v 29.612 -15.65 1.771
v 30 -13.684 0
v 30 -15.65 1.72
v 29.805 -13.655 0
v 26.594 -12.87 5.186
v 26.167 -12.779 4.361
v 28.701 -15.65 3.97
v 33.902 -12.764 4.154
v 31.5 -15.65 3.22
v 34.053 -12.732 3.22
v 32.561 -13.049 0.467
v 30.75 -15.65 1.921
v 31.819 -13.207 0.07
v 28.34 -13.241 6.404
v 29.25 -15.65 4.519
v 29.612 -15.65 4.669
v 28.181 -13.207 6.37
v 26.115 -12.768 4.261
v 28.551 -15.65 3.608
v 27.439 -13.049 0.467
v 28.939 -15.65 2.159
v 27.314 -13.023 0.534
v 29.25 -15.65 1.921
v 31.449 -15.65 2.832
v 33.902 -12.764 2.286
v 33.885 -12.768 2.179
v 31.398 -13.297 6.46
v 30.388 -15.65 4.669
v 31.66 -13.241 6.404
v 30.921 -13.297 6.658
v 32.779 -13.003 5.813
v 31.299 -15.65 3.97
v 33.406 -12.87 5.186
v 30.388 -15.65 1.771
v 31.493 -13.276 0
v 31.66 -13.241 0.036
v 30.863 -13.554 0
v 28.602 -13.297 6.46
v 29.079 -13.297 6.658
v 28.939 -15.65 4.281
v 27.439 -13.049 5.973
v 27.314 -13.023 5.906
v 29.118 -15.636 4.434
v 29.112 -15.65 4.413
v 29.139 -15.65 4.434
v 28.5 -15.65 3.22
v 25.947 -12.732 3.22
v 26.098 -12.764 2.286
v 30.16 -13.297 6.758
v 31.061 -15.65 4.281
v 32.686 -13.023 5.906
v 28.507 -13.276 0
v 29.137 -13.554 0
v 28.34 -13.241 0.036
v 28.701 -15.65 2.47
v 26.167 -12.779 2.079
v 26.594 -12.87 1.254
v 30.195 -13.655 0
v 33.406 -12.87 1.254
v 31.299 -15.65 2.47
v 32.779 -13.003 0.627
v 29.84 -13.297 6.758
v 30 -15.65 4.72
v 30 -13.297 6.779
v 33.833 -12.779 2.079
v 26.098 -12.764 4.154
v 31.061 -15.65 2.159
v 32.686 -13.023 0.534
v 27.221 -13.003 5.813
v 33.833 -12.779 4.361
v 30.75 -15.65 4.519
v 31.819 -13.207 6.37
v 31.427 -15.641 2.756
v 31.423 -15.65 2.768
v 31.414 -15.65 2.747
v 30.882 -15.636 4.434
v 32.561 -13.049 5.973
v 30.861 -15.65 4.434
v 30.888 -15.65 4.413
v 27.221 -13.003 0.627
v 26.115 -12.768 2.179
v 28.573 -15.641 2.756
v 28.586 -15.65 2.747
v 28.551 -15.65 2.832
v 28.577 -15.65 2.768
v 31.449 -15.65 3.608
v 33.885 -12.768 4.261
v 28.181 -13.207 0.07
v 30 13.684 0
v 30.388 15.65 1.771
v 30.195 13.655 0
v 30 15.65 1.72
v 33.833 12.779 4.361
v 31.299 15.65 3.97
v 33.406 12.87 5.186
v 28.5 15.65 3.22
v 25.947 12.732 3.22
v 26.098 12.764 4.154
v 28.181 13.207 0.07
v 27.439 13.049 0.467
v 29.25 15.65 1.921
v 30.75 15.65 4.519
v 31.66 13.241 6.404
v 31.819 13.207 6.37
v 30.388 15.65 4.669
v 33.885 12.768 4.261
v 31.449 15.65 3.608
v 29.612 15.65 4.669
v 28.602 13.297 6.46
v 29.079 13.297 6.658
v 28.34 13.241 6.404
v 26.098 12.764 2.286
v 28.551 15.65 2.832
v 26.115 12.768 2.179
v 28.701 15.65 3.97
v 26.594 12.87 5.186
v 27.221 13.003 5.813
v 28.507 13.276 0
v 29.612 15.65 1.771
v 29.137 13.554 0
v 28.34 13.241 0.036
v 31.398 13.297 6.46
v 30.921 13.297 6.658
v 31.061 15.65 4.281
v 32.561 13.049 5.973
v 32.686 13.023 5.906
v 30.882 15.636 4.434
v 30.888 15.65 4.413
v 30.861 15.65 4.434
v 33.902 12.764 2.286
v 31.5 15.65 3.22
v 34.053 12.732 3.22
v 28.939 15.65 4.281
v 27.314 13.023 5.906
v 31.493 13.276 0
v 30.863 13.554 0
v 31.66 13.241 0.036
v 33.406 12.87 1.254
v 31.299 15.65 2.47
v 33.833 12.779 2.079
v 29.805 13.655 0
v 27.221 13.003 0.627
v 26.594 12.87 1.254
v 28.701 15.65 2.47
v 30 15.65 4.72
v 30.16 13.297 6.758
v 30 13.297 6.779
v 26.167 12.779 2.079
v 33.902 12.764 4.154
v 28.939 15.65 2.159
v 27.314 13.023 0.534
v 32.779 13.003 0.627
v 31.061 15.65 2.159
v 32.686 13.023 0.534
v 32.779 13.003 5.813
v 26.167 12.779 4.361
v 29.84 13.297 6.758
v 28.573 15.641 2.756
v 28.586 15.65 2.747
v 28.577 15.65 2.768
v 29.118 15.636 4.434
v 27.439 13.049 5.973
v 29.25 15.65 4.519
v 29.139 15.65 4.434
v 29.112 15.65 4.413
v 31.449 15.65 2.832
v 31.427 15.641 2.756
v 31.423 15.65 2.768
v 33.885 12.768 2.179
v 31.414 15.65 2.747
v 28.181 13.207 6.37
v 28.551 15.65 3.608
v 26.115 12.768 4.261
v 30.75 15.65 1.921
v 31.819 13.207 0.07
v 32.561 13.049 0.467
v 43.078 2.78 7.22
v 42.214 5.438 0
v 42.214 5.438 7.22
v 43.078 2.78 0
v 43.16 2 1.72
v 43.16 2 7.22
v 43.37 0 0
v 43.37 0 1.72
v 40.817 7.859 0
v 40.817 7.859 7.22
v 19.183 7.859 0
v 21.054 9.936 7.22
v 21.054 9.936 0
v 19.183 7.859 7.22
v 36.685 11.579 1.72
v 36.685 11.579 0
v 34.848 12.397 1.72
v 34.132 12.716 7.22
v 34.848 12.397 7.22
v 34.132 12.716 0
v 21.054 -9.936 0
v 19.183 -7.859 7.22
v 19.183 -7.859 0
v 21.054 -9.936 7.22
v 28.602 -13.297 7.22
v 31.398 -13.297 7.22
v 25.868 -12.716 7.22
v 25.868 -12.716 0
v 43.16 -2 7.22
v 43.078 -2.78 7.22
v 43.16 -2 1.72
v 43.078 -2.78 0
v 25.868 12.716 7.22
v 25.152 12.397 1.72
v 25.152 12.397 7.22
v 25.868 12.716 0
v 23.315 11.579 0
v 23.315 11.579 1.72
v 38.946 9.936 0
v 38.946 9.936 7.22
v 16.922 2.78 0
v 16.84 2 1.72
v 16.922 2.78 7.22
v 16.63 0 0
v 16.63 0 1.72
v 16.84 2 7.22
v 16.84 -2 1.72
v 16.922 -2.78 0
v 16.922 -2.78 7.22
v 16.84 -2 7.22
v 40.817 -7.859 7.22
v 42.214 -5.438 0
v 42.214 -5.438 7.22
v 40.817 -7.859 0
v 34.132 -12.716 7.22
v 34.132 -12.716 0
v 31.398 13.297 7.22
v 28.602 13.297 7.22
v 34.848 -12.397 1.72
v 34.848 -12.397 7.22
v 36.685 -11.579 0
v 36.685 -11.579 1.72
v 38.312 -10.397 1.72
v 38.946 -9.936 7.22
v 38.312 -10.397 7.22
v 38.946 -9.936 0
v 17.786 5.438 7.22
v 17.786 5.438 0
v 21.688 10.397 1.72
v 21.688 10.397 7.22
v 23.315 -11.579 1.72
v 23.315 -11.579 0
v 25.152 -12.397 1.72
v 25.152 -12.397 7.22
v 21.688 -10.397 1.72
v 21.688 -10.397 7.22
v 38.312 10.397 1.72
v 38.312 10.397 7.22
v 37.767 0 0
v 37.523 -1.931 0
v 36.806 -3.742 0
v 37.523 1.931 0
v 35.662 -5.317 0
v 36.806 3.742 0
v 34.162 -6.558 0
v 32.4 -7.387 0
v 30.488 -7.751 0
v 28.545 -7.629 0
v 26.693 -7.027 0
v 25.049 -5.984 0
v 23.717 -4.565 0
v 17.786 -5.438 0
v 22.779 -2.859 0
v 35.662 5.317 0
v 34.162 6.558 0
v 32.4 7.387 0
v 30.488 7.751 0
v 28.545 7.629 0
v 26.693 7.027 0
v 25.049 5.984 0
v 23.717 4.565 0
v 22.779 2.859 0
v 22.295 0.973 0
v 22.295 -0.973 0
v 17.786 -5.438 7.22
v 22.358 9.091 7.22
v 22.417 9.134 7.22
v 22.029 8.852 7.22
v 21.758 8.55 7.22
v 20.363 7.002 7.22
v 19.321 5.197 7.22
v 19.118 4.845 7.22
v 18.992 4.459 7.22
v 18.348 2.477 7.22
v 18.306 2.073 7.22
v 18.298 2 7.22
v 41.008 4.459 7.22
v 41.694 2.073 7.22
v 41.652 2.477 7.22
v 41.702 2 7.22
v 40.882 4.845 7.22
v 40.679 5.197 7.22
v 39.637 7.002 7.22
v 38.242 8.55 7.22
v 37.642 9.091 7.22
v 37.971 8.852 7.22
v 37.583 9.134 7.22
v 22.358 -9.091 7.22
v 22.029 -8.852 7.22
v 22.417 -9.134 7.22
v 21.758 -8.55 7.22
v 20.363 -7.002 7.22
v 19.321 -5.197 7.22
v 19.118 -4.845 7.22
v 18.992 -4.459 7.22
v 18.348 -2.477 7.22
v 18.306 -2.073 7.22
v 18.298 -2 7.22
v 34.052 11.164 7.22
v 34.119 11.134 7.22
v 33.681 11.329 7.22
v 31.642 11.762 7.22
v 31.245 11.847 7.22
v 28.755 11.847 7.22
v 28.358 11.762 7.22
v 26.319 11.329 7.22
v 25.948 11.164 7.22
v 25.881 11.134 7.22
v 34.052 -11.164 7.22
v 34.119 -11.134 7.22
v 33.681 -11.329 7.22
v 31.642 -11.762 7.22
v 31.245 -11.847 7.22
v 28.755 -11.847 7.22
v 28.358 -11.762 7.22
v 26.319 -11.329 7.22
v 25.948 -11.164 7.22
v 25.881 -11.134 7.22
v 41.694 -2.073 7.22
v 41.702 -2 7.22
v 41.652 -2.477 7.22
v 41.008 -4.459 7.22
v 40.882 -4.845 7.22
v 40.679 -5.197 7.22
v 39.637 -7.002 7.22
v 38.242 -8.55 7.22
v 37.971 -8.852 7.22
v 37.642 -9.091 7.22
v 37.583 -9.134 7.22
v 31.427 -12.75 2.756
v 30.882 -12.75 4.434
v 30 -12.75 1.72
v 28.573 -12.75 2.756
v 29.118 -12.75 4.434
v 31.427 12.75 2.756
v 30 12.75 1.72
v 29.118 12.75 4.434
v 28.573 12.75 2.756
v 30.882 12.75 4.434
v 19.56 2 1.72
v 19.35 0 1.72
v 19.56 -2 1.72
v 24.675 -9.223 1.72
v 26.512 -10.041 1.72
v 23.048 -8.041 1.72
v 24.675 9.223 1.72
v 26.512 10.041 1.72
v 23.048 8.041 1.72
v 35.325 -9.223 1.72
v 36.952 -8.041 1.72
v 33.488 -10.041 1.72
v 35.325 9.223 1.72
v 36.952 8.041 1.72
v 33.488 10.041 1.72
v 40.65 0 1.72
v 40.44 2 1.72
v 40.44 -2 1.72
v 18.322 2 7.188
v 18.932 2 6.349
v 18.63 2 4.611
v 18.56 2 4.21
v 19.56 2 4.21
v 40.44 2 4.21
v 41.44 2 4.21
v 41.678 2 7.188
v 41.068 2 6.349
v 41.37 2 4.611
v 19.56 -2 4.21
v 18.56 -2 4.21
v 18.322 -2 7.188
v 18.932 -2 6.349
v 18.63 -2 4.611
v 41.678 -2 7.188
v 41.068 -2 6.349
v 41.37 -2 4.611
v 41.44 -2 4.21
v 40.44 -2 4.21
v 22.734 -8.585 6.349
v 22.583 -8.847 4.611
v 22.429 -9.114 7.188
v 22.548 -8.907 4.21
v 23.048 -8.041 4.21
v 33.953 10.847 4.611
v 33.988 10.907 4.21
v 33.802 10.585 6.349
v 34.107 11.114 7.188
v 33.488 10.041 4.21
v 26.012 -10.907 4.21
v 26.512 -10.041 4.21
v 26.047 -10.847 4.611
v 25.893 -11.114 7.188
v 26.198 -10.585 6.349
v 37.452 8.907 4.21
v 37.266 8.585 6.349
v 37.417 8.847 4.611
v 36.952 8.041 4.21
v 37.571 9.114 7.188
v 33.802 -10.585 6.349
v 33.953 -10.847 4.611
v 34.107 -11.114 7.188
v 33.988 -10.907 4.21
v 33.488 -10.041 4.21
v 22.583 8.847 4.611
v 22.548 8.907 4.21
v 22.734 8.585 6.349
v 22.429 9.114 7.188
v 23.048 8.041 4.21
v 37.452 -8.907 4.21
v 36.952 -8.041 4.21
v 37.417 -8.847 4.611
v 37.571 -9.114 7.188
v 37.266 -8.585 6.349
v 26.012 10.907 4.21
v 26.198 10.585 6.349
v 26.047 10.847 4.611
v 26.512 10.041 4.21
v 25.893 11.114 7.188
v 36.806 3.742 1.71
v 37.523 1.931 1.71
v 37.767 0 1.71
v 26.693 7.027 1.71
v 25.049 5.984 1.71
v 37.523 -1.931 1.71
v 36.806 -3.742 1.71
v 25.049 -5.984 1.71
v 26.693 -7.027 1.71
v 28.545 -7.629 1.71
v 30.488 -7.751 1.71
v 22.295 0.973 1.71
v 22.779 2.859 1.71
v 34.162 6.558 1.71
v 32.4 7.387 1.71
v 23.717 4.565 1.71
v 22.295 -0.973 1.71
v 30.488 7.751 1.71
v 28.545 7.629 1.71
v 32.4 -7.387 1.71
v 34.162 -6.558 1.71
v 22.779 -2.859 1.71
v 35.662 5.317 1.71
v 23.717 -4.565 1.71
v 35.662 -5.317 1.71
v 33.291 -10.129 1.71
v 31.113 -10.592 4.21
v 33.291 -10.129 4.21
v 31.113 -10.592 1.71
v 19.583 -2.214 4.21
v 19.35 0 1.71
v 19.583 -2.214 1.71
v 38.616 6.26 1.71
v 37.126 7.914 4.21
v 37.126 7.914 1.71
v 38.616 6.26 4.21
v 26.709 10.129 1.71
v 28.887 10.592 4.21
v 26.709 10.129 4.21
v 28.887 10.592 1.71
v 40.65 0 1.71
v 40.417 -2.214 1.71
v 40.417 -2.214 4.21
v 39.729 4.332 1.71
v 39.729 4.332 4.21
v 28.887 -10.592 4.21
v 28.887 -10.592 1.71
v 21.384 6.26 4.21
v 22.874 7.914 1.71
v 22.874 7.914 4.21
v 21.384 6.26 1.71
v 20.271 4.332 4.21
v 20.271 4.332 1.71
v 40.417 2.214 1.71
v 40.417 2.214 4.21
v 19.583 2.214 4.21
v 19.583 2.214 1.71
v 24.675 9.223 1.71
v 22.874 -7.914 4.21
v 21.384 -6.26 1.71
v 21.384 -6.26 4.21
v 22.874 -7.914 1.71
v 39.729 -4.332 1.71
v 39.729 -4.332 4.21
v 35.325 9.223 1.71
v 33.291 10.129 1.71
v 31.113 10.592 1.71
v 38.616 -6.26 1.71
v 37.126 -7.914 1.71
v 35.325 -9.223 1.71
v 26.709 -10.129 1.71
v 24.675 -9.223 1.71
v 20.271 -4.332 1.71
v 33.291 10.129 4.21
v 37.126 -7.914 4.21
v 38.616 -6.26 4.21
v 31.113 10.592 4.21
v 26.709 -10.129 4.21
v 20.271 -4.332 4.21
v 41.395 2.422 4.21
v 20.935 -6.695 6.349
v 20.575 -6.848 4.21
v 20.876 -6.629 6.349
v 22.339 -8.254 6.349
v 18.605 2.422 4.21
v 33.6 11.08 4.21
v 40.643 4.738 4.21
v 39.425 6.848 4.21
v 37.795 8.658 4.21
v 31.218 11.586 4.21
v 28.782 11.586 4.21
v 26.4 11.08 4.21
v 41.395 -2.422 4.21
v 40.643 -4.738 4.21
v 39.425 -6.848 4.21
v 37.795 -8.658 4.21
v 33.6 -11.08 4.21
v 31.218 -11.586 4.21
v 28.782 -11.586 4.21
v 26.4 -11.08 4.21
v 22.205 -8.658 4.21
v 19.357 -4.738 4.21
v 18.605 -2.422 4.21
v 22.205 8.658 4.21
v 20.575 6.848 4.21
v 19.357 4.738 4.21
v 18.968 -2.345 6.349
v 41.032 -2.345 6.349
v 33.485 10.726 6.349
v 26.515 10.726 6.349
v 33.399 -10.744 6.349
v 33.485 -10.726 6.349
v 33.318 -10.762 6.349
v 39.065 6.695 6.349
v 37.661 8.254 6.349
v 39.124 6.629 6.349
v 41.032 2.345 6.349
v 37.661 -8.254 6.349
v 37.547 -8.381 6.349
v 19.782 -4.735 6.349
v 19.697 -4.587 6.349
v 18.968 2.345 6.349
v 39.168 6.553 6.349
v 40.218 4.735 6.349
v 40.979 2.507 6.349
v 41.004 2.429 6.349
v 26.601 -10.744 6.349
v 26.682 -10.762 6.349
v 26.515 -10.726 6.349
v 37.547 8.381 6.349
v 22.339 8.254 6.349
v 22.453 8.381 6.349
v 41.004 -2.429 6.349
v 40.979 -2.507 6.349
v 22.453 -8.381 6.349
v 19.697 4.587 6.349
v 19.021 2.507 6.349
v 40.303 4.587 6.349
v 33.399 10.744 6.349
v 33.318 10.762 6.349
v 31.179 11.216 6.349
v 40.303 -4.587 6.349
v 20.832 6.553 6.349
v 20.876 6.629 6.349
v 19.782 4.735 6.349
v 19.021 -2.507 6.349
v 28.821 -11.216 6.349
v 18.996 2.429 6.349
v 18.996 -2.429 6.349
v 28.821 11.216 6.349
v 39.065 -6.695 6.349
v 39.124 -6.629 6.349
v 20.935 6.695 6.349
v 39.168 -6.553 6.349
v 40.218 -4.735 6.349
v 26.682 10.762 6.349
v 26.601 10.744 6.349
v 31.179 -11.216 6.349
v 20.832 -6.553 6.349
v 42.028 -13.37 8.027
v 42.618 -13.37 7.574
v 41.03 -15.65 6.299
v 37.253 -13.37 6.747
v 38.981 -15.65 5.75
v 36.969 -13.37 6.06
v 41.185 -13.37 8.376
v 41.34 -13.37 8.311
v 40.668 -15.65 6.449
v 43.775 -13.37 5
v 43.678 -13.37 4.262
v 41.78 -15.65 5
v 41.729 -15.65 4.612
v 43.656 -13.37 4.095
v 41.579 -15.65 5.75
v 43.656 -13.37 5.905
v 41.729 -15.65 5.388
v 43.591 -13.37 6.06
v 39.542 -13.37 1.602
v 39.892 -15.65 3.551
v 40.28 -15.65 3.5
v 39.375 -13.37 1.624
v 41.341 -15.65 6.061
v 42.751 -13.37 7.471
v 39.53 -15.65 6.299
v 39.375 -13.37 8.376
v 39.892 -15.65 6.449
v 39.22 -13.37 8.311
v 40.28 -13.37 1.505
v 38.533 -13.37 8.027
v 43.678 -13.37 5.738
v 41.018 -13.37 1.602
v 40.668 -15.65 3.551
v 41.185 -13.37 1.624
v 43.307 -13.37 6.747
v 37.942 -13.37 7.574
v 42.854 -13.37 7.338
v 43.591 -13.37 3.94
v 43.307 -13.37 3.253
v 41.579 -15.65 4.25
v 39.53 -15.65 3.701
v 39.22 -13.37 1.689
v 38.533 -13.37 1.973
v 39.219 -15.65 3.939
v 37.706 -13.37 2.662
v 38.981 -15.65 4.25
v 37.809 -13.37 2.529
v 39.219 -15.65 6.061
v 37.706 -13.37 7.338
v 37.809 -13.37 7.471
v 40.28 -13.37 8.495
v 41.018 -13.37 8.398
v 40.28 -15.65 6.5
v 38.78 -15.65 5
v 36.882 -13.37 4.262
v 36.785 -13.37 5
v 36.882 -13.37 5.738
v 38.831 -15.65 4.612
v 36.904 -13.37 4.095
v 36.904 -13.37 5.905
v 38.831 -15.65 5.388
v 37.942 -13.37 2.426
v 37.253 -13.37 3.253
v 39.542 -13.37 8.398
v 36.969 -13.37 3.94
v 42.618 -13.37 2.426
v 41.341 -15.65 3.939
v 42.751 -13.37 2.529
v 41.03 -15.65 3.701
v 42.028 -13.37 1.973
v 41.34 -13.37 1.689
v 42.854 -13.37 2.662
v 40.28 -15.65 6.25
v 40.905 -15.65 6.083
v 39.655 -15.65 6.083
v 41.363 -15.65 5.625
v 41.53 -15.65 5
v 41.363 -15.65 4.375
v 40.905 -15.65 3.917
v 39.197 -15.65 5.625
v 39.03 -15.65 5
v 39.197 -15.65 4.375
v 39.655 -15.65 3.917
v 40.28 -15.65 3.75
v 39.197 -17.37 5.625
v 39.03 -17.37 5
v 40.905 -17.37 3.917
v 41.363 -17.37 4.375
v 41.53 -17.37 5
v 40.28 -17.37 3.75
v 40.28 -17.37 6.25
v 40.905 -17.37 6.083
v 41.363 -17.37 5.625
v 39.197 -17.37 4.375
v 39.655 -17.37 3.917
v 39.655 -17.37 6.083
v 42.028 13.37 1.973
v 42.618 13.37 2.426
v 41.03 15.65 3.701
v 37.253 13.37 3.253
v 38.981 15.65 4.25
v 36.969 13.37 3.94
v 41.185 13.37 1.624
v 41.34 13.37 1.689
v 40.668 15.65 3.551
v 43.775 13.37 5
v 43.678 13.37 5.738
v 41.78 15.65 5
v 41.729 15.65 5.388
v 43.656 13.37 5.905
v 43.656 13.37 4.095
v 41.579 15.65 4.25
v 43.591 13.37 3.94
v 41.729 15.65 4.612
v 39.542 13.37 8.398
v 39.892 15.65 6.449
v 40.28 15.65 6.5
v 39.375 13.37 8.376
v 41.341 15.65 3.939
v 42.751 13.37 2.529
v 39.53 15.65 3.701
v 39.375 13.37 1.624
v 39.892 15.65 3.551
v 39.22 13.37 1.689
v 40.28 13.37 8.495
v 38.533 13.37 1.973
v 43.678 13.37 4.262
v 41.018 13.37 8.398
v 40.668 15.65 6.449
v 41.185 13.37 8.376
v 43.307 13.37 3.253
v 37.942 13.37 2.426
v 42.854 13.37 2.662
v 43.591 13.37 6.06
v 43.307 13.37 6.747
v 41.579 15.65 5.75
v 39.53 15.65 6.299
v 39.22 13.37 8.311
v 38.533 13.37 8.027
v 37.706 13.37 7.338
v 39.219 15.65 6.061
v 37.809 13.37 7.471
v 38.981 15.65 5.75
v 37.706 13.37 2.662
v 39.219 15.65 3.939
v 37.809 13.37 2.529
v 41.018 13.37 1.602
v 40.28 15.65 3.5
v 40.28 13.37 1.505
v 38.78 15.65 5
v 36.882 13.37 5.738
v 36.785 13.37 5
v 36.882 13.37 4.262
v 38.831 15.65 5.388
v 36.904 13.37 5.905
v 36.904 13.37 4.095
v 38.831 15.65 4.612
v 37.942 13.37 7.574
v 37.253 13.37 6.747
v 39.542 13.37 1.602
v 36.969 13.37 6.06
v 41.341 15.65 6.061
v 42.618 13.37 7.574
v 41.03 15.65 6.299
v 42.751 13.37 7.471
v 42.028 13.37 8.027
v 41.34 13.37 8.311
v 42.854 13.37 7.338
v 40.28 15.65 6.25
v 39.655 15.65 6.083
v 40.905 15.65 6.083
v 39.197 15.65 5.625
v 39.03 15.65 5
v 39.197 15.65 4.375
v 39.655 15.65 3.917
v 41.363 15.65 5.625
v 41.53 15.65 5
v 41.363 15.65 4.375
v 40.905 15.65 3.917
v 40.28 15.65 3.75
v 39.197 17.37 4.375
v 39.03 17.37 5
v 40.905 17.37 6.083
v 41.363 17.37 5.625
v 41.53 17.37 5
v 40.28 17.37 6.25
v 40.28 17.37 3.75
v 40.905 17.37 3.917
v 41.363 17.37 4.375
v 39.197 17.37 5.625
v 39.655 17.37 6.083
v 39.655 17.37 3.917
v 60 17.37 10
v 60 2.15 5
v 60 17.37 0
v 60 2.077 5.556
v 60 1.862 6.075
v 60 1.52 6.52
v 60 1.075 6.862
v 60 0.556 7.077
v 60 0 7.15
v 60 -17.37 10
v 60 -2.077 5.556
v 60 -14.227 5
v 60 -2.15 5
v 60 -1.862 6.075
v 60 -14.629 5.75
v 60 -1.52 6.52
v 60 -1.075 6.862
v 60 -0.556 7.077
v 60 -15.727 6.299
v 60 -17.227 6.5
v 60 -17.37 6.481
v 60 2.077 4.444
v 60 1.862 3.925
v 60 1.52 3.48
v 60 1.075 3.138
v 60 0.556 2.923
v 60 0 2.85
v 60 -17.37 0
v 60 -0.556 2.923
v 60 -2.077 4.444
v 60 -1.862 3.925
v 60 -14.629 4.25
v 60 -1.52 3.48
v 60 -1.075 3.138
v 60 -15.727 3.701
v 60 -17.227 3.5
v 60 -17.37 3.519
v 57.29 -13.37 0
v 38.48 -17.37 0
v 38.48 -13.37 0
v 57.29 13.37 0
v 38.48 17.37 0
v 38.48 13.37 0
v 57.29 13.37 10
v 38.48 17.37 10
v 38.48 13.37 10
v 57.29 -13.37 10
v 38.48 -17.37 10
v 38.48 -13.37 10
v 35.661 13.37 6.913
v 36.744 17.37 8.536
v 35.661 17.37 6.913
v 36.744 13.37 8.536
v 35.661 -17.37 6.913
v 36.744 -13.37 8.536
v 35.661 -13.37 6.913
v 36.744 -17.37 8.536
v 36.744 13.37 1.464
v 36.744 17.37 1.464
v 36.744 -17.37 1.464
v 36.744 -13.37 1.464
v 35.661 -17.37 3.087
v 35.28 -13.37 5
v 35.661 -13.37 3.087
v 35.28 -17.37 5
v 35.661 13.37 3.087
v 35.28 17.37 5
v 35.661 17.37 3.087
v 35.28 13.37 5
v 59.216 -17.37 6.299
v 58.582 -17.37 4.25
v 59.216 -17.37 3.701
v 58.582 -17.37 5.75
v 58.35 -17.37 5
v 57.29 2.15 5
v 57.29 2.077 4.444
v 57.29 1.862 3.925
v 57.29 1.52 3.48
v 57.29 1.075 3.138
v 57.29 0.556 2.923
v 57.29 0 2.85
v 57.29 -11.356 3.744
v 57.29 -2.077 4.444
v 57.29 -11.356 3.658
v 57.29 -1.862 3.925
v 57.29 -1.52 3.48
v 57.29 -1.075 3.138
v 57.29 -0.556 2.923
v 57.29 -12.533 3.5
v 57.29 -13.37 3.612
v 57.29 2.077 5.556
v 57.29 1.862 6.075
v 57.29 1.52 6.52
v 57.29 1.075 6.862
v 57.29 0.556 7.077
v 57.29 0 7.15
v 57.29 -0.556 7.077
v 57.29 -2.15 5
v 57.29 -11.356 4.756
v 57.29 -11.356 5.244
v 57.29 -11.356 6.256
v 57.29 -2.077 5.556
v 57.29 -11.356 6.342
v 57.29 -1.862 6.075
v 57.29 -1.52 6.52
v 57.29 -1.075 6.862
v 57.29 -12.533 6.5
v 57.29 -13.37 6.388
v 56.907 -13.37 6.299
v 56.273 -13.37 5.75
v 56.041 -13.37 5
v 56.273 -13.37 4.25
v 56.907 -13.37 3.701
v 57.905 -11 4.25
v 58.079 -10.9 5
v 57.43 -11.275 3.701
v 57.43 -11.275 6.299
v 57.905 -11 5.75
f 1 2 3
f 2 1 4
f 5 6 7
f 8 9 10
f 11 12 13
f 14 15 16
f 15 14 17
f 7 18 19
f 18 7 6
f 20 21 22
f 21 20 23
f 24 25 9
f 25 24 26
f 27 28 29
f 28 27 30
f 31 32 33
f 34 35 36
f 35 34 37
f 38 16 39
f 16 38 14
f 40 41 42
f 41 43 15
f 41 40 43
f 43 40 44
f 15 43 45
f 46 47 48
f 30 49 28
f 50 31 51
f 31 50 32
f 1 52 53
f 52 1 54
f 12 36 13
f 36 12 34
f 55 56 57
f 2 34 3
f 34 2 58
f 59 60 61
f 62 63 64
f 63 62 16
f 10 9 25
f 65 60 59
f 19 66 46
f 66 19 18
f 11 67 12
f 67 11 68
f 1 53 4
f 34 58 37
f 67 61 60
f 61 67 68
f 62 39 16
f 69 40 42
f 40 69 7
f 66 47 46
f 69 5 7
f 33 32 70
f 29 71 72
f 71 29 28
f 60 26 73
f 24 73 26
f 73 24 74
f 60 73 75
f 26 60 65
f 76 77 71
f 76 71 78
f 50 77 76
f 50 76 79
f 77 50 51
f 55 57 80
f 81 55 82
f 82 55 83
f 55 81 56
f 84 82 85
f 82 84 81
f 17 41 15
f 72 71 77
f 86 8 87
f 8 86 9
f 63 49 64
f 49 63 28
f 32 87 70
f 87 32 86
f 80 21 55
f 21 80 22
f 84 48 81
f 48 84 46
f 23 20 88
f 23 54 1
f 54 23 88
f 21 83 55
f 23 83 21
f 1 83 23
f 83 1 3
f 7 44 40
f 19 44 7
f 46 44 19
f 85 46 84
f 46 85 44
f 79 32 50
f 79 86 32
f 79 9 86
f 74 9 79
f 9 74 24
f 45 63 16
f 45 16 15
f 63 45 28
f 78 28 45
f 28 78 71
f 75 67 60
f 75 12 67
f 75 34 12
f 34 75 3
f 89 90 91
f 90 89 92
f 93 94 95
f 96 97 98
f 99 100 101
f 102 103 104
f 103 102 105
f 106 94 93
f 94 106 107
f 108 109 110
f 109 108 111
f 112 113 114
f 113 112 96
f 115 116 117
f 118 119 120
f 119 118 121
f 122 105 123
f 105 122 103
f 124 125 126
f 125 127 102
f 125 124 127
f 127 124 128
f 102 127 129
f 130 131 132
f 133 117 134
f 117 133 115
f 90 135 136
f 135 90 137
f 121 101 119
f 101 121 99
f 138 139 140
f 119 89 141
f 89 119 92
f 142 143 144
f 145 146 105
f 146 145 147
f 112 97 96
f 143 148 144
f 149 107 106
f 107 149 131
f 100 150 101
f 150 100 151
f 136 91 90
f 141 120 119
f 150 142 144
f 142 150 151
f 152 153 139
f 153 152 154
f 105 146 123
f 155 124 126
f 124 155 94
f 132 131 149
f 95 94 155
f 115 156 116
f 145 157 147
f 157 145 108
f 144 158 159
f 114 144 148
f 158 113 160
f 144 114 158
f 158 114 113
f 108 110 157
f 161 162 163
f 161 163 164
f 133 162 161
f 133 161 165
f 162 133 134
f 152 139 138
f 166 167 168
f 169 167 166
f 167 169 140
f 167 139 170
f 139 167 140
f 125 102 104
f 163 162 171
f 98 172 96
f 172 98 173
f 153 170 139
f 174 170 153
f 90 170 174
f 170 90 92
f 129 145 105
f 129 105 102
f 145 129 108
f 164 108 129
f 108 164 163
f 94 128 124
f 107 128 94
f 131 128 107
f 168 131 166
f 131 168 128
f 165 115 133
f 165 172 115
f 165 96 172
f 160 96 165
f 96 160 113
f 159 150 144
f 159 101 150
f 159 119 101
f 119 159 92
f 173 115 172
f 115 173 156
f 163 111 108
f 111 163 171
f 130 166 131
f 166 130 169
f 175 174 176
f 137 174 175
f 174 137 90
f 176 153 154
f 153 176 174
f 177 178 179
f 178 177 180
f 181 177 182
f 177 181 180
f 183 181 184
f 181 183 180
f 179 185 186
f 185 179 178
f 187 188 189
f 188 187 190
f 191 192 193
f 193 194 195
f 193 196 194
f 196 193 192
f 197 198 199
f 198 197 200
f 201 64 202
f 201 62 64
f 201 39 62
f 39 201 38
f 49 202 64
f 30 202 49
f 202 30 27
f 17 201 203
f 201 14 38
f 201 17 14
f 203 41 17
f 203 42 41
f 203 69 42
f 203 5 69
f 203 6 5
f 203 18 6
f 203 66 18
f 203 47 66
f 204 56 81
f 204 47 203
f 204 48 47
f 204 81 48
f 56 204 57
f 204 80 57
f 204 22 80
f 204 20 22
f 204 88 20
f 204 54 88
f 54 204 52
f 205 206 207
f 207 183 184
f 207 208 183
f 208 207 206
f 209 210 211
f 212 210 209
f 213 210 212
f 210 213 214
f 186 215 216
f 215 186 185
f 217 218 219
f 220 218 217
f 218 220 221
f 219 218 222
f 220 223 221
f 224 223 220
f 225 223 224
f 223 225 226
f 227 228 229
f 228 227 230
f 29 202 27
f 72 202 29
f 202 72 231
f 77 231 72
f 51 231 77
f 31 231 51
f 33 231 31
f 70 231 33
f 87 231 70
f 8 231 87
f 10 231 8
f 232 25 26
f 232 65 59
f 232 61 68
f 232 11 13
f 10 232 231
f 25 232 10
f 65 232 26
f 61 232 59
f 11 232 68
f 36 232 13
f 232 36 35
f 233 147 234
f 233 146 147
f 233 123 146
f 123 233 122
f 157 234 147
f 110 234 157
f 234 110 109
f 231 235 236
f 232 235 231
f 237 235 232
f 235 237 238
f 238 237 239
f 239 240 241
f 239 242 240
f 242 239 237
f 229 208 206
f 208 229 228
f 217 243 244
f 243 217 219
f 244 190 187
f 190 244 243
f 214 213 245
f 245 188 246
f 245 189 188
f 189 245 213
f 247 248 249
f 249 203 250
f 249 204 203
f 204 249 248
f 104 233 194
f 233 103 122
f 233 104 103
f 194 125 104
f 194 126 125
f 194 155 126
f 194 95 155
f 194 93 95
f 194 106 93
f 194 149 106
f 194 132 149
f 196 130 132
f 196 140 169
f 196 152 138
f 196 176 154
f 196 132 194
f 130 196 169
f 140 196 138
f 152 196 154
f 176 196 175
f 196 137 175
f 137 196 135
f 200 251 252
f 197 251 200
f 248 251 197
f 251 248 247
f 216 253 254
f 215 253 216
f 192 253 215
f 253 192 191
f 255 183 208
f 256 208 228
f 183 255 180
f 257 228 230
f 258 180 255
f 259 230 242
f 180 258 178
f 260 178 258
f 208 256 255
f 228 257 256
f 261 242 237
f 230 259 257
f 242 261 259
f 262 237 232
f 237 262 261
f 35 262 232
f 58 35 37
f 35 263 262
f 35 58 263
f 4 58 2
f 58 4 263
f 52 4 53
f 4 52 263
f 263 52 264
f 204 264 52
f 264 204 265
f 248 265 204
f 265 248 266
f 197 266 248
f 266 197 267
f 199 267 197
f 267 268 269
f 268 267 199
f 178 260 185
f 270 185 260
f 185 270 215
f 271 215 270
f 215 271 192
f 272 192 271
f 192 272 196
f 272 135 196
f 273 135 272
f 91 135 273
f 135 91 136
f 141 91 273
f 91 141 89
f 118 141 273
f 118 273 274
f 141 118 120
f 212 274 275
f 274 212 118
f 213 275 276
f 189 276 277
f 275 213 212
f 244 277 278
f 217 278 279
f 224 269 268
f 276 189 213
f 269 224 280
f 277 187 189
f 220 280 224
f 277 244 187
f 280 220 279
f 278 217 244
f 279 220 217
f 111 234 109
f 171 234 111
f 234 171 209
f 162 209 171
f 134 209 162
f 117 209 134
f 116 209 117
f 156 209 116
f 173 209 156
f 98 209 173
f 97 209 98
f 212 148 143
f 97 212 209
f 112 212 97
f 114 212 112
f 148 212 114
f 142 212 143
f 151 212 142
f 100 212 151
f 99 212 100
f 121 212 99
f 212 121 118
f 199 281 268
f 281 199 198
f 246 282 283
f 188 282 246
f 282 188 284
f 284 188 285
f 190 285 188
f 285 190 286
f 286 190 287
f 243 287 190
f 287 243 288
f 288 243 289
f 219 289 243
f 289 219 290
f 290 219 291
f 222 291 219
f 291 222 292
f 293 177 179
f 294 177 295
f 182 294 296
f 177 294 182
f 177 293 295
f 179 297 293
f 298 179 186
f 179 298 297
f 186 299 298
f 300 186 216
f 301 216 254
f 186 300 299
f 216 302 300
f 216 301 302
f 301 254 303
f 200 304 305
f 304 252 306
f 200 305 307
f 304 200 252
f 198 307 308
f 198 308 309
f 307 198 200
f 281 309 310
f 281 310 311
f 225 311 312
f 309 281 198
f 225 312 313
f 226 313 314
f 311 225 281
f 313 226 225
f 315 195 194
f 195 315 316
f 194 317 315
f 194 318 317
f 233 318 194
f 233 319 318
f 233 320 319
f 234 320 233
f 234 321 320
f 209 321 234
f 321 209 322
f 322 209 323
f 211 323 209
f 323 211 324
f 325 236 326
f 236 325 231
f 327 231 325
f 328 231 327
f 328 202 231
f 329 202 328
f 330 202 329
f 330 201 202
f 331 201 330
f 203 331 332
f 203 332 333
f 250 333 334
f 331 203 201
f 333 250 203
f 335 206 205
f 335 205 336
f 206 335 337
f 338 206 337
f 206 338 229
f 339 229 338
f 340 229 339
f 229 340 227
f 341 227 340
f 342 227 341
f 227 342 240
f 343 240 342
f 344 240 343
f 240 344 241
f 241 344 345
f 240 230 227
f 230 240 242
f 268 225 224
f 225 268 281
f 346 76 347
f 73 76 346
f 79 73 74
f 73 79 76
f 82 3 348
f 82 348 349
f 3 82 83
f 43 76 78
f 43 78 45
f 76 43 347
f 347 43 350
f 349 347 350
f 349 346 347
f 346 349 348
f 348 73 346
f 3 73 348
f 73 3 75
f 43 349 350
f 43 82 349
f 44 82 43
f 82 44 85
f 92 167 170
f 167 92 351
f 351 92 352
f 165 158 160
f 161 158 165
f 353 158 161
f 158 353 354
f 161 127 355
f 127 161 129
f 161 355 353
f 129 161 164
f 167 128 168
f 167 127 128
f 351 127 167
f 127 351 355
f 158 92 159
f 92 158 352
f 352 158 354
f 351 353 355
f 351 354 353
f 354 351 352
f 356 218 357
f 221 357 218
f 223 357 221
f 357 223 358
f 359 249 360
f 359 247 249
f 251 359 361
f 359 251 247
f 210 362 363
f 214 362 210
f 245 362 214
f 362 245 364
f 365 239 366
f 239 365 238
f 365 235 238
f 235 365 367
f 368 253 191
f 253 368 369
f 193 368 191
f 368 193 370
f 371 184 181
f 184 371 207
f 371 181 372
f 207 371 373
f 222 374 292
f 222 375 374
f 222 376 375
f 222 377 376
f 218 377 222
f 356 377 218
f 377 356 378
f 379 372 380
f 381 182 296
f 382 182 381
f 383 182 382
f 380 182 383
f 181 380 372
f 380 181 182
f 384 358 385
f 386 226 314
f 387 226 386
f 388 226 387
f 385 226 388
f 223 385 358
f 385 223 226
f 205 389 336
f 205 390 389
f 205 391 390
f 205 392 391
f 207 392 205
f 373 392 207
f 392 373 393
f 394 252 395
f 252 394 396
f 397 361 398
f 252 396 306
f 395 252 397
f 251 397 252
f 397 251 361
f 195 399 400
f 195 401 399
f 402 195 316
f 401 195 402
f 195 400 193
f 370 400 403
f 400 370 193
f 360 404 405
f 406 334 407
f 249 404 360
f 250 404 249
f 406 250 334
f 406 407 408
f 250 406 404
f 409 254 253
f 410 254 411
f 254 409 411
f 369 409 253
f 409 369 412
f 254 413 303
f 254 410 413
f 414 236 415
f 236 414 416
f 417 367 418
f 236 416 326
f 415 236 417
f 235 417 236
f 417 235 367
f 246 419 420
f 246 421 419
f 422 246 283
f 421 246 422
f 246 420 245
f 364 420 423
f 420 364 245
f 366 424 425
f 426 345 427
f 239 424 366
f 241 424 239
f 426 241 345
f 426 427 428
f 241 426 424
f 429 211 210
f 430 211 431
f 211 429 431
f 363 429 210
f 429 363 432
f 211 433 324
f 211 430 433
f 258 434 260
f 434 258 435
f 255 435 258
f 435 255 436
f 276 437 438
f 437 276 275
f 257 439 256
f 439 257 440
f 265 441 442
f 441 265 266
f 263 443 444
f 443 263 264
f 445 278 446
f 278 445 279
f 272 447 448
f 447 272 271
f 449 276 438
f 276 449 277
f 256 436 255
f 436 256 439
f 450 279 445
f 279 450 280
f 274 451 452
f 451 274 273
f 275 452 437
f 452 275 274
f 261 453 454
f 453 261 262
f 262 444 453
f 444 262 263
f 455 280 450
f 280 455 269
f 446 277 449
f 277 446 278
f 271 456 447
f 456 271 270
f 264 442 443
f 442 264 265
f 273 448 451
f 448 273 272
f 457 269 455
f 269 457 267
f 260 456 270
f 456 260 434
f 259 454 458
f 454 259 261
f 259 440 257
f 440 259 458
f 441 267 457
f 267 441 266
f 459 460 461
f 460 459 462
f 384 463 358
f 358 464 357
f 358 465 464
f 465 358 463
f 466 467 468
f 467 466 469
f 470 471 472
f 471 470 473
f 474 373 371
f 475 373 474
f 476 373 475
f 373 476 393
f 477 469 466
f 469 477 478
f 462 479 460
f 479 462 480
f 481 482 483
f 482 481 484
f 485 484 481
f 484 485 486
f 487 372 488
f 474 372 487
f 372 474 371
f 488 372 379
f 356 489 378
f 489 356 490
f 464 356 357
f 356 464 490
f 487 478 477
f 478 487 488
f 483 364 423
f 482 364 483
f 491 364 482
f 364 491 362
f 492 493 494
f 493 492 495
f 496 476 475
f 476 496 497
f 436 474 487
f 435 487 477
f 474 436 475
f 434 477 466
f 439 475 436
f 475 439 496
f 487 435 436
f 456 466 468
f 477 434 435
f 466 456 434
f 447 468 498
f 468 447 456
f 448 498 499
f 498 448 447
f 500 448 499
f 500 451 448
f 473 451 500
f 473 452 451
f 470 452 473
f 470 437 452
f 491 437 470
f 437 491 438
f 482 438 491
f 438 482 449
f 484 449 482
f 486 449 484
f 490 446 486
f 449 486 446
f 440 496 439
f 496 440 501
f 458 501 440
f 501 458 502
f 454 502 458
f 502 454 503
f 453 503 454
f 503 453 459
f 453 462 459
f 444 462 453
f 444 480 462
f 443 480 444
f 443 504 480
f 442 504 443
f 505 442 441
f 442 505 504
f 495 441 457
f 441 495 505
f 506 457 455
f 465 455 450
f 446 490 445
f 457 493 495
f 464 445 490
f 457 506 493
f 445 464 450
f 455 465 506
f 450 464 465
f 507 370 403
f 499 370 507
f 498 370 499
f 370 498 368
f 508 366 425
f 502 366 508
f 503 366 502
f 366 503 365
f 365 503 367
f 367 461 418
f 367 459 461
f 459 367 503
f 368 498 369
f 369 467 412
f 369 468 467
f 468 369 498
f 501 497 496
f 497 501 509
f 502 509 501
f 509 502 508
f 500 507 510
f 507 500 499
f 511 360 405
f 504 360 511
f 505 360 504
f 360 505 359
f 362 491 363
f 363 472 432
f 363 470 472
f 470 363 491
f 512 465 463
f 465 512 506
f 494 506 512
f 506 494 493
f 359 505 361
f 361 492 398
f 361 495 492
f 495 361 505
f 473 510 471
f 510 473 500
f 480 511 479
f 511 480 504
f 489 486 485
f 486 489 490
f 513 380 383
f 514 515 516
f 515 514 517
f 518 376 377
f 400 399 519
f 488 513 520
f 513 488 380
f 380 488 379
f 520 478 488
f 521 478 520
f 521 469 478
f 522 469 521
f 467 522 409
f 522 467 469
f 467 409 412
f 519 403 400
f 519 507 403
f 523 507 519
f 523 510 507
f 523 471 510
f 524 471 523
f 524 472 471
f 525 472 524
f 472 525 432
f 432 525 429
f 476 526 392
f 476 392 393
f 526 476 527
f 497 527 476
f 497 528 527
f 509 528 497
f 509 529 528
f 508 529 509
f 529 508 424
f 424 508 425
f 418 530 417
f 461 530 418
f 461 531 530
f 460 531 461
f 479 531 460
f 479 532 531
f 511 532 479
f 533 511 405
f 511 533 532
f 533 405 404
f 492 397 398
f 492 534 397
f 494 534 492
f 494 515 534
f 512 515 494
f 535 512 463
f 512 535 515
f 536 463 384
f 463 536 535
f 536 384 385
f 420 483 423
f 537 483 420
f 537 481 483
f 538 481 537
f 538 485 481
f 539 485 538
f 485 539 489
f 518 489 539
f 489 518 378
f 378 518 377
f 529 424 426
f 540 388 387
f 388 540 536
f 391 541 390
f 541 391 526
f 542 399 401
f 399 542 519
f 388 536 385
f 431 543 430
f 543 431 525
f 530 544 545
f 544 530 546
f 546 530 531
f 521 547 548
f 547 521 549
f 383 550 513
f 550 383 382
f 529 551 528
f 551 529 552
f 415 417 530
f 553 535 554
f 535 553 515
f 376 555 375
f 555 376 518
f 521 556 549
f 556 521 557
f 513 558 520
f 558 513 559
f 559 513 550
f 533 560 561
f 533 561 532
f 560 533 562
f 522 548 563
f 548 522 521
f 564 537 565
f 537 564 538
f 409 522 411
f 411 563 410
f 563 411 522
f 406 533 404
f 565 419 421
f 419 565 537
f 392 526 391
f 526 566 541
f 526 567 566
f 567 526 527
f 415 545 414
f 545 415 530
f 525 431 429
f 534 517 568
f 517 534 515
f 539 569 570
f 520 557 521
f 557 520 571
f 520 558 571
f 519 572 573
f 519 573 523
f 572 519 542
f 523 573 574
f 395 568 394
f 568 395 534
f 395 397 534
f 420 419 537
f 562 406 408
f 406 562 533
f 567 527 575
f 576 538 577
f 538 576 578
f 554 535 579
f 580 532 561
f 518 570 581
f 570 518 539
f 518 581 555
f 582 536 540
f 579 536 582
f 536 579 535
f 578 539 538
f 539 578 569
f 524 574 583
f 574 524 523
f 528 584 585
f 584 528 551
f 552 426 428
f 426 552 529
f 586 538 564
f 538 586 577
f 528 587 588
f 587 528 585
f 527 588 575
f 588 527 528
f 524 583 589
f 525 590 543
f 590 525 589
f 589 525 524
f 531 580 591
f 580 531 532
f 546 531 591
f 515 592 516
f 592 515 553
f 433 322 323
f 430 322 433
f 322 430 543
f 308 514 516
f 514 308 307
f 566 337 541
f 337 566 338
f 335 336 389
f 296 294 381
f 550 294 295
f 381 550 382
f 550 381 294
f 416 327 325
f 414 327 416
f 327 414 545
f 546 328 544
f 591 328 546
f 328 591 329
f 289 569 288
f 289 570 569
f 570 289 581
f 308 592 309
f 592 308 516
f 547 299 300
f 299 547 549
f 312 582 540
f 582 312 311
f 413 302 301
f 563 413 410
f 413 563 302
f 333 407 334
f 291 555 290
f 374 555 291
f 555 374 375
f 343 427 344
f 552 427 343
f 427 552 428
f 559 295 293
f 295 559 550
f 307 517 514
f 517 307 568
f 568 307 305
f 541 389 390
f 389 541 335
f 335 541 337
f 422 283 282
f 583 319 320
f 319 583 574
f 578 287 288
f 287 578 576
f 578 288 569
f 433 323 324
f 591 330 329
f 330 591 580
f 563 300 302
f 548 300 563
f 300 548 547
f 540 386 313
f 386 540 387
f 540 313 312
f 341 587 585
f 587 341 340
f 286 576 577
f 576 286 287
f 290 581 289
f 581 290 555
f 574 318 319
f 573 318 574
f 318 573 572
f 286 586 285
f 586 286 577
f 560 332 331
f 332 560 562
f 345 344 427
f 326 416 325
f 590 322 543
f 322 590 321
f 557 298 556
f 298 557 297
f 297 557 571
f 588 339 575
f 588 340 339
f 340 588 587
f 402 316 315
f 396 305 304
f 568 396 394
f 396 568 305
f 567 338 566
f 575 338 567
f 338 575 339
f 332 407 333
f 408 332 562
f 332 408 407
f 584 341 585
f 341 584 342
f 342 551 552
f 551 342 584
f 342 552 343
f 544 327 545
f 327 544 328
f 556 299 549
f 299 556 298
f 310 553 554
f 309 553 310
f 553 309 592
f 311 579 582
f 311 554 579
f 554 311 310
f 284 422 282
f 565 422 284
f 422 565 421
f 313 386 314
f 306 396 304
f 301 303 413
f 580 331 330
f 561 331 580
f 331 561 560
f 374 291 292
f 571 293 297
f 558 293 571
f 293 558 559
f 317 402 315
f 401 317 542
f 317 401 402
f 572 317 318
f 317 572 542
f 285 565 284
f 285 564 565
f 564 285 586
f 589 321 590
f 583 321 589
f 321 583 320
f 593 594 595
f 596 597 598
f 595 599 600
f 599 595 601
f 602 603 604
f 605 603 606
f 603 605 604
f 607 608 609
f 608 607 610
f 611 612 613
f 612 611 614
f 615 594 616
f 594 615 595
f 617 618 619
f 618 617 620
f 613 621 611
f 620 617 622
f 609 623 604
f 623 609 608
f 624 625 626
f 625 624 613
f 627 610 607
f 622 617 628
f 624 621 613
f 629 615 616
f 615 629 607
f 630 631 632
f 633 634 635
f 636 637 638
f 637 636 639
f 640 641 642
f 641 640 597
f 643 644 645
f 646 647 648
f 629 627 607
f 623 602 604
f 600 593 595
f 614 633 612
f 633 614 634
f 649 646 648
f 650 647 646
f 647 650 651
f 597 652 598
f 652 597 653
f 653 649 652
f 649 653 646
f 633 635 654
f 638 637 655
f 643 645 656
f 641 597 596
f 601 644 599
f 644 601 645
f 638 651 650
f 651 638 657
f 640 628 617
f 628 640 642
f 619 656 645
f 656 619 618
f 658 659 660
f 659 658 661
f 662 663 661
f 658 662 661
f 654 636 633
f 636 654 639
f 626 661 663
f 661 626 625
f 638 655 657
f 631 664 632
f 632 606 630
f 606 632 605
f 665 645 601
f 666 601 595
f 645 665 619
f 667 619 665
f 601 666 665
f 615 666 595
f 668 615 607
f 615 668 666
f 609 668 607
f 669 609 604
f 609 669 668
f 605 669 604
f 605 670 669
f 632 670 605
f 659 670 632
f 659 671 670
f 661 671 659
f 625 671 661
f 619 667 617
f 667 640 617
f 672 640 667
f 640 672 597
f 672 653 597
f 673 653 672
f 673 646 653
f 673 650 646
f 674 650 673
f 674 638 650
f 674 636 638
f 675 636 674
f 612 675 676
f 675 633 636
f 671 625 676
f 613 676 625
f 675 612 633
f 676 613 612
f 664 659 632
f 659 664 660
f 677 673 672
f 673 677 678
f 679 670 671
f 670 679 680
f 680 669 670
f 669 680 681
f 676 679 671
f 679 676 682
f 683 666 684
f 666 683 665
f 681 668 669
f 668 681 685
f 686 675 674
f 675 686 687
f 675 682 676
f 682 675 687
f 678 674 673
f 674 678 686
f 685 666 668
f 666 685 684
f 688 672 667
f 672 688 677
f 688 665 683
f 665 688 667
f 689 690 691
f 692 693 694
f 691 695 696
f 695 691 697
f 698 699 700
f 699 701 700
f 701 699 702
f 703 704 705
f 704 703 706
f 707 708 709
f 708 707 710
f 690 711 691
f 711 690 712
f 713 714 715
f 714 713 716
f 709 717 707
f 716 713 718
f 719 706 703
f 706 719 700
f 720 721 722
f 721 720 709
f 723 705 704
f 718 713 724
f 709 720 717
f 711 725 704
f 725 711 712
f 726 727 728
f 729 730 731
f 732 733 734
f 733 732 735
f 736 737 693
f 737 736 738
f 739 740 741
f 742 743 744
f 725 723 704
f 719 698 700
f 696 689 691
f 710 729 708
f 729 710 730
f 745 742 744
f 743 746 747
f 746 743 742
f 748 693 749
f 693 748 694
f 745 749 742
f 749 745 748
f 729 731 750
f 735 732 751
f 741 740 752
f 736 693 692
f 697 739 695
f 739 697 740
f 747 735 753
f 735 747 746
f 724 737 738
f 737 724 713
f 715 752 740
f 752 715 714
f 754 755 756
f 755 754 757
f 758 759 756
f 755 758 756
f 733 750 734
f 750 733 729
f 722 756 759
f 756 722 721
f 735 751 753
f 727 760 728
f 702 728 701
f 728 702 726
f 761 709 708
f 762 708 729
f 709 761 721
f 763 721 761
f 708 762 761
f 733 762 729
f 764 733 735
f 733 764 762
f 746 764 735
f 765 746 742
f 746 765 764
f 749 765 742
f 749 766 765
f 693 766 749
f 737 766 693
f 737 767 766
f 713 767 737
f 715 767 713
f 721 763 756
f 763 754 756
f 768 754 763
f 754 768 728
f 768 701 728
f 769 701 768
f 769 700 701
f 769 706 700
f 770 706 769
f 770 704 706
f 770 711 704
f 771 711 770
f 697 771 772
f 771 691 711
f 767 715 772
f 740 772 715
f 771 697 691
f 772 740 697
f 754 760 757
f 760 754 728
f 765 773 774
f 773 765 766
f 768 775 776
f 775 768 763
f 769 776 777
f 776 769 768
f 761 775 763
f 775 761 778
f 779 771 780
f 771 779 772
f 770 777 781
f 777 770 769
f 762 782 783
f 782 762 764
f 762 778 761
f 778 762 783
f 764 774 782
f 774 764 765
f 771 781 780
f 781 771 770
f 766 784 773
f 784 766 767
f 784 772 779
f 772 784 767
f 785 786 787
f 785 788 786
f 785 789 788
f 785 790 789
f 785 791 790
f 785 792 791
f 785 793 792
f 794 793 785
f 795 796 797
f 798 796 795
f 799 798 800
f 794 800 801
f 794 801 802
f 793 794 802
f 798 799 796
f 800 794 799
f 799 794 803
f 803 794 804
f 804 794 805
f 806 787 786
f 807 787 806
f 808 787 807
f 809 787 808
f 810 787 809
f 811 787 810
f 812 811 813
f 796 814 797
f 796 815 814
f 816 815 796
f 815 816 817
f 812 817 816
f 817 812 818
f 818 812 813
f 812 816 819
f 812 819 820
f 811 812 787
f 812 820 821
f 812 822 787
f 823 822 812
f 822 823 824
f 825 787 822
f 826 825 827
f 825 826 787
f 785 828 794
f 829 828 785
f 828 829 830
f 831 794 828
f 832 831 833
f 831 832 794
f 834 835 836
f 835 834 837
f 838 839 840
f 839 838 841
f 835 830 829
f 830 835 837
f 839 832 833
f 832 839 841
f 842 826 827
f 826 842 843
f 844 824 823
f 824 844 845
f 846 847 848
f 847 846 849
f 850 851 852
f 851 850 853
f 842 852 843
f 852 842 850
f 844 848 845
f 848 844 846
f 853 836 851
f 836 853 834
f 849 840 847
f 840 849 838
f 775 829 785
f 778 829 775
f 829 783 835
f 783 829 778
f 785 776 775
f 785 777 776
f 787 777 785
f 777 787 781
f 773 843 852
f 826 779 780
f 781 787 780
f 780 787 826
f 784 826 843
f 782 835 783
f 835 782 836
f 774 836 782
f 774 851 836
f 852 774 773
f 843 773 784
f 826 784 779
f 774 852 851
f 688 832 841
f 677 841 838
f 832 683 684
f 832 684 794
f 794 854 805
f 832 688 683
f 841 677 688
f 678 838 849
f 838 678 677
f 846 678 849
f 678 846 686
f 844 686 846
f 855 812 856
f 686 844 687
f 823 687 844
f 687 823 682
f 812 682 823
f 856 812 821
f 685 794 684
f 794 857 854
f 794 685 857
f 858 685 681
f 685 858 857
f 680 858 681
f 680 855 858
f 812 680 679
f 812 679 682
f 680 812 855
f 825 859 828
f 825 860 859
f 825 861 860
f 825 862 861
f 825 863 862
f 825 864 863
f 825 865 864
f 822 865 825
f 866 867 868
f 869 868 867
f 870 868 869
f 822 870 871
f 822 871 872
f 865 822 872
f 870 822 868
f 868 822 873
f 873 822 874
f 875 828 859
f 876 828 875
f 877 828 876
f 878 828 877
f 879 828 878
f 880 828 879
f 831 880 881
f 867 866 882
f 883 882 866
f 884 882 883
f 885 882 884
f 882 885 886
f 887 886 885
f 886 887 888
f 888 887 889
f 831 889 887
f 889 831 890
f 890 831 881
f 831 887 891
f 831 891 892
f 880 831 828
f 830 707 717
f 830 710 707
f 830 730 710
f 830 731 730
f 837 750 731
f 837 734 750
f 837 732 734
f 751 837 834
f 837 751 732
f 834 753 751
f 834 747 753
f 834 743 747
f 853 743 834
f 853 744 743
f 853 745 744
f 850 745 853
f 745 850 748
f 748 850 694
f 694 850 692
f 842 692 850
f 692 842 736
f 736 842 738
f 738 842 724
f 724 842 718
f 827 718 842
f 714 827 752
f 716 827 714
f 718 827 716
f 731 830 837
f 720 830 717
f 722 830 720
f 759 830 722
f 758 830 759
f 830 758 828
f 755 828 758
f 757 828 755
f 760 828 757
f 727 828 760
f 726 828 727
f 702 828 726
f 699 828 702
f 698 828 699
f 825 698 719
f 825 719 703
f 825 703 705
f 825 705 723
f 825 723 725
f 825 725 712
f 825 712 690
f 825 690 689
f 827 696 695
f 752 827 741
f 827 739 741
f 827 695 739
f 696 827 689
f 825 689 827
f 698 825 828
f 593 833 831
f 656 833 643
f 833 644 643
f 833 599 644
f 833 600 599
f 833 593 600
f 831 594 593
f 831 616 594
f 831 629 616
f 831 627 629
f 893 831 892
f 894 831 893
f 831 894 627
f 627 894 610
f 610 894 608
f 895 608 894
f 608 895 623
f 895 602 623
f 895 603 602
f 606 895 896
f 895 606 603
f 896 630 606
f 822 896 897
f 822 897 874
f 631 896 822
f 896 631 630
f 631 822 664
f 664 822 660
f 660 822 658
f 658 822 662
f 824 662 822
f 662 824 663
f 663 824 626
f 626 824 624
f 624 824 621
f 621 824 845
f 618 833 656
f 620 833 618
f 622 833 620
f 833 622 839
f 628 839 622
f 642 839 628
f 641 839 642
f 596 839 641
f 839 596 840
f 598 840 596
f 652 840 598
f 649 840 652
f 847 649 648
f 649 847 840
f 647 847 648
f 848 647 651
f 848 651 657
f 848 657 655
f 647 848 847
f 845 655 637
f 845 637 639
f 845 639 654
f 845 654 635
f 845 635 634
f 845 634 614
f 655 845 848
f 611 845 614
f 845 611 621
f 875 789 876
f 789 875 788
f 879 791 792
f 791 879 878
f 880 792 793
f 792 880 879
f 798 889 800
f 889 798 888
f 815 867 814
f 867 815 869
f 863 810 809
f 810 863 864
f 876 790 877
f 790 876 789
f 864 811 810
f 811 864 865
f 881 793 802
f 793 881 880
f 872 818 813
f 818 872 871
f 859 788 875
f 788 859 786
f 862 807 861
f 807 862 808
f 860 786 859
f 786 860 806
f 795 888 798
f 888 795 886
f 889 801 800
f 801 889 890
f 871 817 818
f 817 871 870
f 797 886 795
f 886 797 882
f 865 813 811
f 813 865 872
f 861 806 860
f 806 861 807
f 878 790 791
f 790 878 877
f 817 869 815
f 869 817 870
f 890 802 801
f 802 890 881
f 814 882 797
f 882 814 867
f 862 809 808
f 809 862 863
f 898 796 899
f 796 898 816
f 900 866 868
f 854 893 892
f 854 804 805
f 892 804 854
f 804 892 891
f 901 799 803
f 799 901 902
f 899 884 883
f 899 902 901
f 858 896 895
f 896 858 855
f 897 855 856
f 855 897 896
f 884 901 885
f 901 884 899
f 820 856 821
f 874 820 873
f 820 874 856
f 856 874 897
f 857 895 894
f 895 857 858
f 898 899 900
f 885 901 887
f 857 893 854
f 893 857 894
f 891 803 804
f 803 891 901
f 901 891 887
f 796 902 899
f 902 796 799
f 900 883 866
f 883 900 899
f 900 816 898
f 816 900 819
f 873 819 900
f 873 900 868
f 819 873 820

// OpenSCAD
//////////////////////////////////////////////////////////////////////////////////////
///
///  Tiltable frame for G4-type SMD LED lamps
///
///  This is a little tiltable and rotatable frame to mount the easily available
///  and inexpensive round G4 type 12V SMD LED lamps.
///
///  The frame consists of two printed part, the LED holder and the base.  These
///  two parts are joined by a conical hinge, so that the angle of the lamp can
///  be adjusted as needed.  The conical hinge holds by friction, but screw holes
///  are also provided in case a firmer grip is needed. The frame has a central
///  screw hole so that it can be attached to any flat surface.  If a washer is
///  used and the screw is not tightened too strongly, the lamp can also be 
///  rotated around the screw, providing full angular coverage.  A hole in one corner
///  of the frame can be used for feeding the cables through.
///  
///  The led carrier is simply pushed into the led holder - it should snap in with
///  a click.
///
//////////////////////////////////////////////////////////////////////////////////////
///
///  2013-11-27 Heinz Spiess, Switzerland
///
///  released under Creative Commons - Attribution - Share Alike licence
//////////////////////////////////////////////////////////////////////////////////////

// The following are defined as parameters of the modules
// ledD = 23.3; // diameter of led carrier
// wall = 1.72; // thickness of walls

// The following are globally parametrized
ledM = 1;       // margin to outermost led
ledH = 3;       // led height
ledP = 0.7;     // position of click
ledC = 0.4;     // depth of click 
ledG = 4;       // gap width
ledB = 2;       // space needed at back of led
hingeW = 10;    // hinge width
hingeD = 4;     // hinge depth
hingeH = 18;    // hinge height
hingeR = 1.5;   // hinge radius
eps = 0;        // separation between outer and inner parts of hinge
granu = 24;     // angular granularity of hinge

// tiltable circular led holder
module ledholder(ledD=23.3,wall=1.72){
      
    difference(){
        union(){
	   // bottom plate
	   cylinder(r=ledD/2+wall,h=ledH+wall+ledB);
	   // hinge
	   for(a=[90,270])rotate(a)
	      translate([-ledD/2-hingeD,0,(wall+ledH/2)])
	         rotate([0,90,0])cylinder(r1=hingeR,r2=hingeW/2,h=hingeD,$fn=granu);

        }

        // screw holes in hinge
	for(a=[90,270])rotate(a)
	      translate([-ledD/2-hingeD-0.1,0,(wall+ledH/2)])
	         rotate([0,90,0])cylinder(r=hingeR-eps,h=hingeD-1);

        // cut off top excess part of hinge
	translate([0,0,ledH+wall+ledB])cylinder(r=ledD/2+wall+hingeD,h=hingeW);
        // cut off bottom excess part of hinge
	translate([0,0,-hingeW])cylinder(r=ledD/2+wall+hingeD,h=hingeW);
	// hole in bottom plate
	translate([0,0,-0.01])cylinder(r=ledD/3,h=wall+0.02);
	// spacer between bottom plate and led carrier
	translate([0,0,wall-0.01])cylinder(r=ledD/2-ledM,h=ledB+0.02);
	// seat of led carrier and lower snap-in
	translate([0,0,wall+ledB-0.01])cylinder(r=ledD/2,r2=ledD/2-ledC,h=ledP*ledH+0.2);
	// upper snap-in
	translate([0,0,wall+ledB+ledP*ledH-0.01])
	   cylinder(r1=ledD/2-ledC,r2=ledD/2+ledC,h=(1-ledP)*ledH+0.2);
        // cut-out 6 sectors
	for(a=[0:60:359])rotate(a)translate([-ledD,-ledG/2,wall])cube([2*ledD,ledG,2*ledH+ledB]);


    }
}

// base of led frame
module ledbase(ledD=23.3,hingeH=18,wall=1.72){
  difference(){
    union(){
        
	   hull(){
	      // rectangular bottom part
              translate([-hingeW/2,-ledD/2-eps-hingeD-wall,0])
	         cube([hingeW,ledD+2*eps+2*hingeD+2*wall,wall+hingeH+1.8]);
              // cylindical top part
	      translate([0,-ledD/2-eps-hingeD-wall,wall+hingeH])rotate([-90,0,0])
	         cylinder(r=hingeW/2,h=2*hingeD+2*wall+ledD+2*eps);
	   }
    }
    // rectangular cut-out
    translate([-hingeW/2-0.01,-ledD/2-eps-wall,wall+0.99])
       cube([hingeW+0.02,ledD+2*eps+2*wall,hingeH+hingeW/2+1]);
    // hinge cut-out
    for(a=[90,270])rotate(a)
       translate([-ledD/2+eps-hingeD,0,wall+hingeH])rotate([0,90,0]){
           // conical part
           cylinder(r1=hingeR,r2=hingeW/2,h=hingeD,$fn=granu);
	   // screw hole
           translate([0,0,-7])cylinder(r=hingeW/8,h=hingeD+9,$fn=12);

       }

    // central hole for mounting screw
    translate([0,0,-1])cylinder(r=4.3/2,h=wall+2,$fn=24);

    // side hole for feeding cables
    translate([0,-ledD/2-eps,wall+1.5])rotate([120,0,0])
           cylinder(r=1.5,h=hingeD+9,$fn=12);
  }
}

// This module composes base and led holder in their final position
// using a given tilt angle of the led holder
// *** Just for illustration - don't use for printing!!! ***
module compose(angle=0,ledD=23.3,hingeH=18,wall=1.72,ledB=0){
  //intersection(){  // use intersection to verify that there is no overlap
  union(){           // use union for normal drawing
    color("red")translate([0,0,hingeH-ledH/2])translate([0,0,+ledH/2+wall/2])rotate([0,angle,0])translate([0,0,-ledH/2-wall/2])ledholder(ledD=ledD,wall=wall,ledB=ledB);
    color("blue")ledbase(ledD=ledD,hingeH=hingeH,wall=wall);
  }
}


module LedFrame6() // AUTO_MAKE_STL
{
    %compose(angle=85,ledD=23.3,wall=1.72,ledB=2.5);
    translate([30,0,0])ledholder(ledD=23.3,wall=1.72,ledB=2.5);
    translate([60,0,hingeW/2])rotate([0,-90,0])ledbase(ledD=23.3,wall=1.72);
}

module LedFrame9() // AUTO_MAKE_STL
{
    %compose(angle=30,ledD=24.5,hingeH=24,wall=2.25,ledB=2.25);
    translate([30,0,0])ledholder(ledD=24.5,wall=2.25,ledB=2.25);
    translate([70,0,hingeW/2])rotate([0,-90,0])
       ledbase(ledD=24.5,hingeH=21,wall=2.25);
}

module LedFrame12() // AUTO_MAKE_STL
{
    %compose(angle=30,ledD=30.0,hingeH=24,wall=2.25,ledB=2.25);
    translate([30,0,0])ledholder(ledD=30.0,wall=2.25,ledB=2.25);
    translate([70,0,hingeW/2])rotate([0,-90,0])
       ledbase(ledD=30.0,hingeH=24,wall=2.25);
}

LedFrame6();
